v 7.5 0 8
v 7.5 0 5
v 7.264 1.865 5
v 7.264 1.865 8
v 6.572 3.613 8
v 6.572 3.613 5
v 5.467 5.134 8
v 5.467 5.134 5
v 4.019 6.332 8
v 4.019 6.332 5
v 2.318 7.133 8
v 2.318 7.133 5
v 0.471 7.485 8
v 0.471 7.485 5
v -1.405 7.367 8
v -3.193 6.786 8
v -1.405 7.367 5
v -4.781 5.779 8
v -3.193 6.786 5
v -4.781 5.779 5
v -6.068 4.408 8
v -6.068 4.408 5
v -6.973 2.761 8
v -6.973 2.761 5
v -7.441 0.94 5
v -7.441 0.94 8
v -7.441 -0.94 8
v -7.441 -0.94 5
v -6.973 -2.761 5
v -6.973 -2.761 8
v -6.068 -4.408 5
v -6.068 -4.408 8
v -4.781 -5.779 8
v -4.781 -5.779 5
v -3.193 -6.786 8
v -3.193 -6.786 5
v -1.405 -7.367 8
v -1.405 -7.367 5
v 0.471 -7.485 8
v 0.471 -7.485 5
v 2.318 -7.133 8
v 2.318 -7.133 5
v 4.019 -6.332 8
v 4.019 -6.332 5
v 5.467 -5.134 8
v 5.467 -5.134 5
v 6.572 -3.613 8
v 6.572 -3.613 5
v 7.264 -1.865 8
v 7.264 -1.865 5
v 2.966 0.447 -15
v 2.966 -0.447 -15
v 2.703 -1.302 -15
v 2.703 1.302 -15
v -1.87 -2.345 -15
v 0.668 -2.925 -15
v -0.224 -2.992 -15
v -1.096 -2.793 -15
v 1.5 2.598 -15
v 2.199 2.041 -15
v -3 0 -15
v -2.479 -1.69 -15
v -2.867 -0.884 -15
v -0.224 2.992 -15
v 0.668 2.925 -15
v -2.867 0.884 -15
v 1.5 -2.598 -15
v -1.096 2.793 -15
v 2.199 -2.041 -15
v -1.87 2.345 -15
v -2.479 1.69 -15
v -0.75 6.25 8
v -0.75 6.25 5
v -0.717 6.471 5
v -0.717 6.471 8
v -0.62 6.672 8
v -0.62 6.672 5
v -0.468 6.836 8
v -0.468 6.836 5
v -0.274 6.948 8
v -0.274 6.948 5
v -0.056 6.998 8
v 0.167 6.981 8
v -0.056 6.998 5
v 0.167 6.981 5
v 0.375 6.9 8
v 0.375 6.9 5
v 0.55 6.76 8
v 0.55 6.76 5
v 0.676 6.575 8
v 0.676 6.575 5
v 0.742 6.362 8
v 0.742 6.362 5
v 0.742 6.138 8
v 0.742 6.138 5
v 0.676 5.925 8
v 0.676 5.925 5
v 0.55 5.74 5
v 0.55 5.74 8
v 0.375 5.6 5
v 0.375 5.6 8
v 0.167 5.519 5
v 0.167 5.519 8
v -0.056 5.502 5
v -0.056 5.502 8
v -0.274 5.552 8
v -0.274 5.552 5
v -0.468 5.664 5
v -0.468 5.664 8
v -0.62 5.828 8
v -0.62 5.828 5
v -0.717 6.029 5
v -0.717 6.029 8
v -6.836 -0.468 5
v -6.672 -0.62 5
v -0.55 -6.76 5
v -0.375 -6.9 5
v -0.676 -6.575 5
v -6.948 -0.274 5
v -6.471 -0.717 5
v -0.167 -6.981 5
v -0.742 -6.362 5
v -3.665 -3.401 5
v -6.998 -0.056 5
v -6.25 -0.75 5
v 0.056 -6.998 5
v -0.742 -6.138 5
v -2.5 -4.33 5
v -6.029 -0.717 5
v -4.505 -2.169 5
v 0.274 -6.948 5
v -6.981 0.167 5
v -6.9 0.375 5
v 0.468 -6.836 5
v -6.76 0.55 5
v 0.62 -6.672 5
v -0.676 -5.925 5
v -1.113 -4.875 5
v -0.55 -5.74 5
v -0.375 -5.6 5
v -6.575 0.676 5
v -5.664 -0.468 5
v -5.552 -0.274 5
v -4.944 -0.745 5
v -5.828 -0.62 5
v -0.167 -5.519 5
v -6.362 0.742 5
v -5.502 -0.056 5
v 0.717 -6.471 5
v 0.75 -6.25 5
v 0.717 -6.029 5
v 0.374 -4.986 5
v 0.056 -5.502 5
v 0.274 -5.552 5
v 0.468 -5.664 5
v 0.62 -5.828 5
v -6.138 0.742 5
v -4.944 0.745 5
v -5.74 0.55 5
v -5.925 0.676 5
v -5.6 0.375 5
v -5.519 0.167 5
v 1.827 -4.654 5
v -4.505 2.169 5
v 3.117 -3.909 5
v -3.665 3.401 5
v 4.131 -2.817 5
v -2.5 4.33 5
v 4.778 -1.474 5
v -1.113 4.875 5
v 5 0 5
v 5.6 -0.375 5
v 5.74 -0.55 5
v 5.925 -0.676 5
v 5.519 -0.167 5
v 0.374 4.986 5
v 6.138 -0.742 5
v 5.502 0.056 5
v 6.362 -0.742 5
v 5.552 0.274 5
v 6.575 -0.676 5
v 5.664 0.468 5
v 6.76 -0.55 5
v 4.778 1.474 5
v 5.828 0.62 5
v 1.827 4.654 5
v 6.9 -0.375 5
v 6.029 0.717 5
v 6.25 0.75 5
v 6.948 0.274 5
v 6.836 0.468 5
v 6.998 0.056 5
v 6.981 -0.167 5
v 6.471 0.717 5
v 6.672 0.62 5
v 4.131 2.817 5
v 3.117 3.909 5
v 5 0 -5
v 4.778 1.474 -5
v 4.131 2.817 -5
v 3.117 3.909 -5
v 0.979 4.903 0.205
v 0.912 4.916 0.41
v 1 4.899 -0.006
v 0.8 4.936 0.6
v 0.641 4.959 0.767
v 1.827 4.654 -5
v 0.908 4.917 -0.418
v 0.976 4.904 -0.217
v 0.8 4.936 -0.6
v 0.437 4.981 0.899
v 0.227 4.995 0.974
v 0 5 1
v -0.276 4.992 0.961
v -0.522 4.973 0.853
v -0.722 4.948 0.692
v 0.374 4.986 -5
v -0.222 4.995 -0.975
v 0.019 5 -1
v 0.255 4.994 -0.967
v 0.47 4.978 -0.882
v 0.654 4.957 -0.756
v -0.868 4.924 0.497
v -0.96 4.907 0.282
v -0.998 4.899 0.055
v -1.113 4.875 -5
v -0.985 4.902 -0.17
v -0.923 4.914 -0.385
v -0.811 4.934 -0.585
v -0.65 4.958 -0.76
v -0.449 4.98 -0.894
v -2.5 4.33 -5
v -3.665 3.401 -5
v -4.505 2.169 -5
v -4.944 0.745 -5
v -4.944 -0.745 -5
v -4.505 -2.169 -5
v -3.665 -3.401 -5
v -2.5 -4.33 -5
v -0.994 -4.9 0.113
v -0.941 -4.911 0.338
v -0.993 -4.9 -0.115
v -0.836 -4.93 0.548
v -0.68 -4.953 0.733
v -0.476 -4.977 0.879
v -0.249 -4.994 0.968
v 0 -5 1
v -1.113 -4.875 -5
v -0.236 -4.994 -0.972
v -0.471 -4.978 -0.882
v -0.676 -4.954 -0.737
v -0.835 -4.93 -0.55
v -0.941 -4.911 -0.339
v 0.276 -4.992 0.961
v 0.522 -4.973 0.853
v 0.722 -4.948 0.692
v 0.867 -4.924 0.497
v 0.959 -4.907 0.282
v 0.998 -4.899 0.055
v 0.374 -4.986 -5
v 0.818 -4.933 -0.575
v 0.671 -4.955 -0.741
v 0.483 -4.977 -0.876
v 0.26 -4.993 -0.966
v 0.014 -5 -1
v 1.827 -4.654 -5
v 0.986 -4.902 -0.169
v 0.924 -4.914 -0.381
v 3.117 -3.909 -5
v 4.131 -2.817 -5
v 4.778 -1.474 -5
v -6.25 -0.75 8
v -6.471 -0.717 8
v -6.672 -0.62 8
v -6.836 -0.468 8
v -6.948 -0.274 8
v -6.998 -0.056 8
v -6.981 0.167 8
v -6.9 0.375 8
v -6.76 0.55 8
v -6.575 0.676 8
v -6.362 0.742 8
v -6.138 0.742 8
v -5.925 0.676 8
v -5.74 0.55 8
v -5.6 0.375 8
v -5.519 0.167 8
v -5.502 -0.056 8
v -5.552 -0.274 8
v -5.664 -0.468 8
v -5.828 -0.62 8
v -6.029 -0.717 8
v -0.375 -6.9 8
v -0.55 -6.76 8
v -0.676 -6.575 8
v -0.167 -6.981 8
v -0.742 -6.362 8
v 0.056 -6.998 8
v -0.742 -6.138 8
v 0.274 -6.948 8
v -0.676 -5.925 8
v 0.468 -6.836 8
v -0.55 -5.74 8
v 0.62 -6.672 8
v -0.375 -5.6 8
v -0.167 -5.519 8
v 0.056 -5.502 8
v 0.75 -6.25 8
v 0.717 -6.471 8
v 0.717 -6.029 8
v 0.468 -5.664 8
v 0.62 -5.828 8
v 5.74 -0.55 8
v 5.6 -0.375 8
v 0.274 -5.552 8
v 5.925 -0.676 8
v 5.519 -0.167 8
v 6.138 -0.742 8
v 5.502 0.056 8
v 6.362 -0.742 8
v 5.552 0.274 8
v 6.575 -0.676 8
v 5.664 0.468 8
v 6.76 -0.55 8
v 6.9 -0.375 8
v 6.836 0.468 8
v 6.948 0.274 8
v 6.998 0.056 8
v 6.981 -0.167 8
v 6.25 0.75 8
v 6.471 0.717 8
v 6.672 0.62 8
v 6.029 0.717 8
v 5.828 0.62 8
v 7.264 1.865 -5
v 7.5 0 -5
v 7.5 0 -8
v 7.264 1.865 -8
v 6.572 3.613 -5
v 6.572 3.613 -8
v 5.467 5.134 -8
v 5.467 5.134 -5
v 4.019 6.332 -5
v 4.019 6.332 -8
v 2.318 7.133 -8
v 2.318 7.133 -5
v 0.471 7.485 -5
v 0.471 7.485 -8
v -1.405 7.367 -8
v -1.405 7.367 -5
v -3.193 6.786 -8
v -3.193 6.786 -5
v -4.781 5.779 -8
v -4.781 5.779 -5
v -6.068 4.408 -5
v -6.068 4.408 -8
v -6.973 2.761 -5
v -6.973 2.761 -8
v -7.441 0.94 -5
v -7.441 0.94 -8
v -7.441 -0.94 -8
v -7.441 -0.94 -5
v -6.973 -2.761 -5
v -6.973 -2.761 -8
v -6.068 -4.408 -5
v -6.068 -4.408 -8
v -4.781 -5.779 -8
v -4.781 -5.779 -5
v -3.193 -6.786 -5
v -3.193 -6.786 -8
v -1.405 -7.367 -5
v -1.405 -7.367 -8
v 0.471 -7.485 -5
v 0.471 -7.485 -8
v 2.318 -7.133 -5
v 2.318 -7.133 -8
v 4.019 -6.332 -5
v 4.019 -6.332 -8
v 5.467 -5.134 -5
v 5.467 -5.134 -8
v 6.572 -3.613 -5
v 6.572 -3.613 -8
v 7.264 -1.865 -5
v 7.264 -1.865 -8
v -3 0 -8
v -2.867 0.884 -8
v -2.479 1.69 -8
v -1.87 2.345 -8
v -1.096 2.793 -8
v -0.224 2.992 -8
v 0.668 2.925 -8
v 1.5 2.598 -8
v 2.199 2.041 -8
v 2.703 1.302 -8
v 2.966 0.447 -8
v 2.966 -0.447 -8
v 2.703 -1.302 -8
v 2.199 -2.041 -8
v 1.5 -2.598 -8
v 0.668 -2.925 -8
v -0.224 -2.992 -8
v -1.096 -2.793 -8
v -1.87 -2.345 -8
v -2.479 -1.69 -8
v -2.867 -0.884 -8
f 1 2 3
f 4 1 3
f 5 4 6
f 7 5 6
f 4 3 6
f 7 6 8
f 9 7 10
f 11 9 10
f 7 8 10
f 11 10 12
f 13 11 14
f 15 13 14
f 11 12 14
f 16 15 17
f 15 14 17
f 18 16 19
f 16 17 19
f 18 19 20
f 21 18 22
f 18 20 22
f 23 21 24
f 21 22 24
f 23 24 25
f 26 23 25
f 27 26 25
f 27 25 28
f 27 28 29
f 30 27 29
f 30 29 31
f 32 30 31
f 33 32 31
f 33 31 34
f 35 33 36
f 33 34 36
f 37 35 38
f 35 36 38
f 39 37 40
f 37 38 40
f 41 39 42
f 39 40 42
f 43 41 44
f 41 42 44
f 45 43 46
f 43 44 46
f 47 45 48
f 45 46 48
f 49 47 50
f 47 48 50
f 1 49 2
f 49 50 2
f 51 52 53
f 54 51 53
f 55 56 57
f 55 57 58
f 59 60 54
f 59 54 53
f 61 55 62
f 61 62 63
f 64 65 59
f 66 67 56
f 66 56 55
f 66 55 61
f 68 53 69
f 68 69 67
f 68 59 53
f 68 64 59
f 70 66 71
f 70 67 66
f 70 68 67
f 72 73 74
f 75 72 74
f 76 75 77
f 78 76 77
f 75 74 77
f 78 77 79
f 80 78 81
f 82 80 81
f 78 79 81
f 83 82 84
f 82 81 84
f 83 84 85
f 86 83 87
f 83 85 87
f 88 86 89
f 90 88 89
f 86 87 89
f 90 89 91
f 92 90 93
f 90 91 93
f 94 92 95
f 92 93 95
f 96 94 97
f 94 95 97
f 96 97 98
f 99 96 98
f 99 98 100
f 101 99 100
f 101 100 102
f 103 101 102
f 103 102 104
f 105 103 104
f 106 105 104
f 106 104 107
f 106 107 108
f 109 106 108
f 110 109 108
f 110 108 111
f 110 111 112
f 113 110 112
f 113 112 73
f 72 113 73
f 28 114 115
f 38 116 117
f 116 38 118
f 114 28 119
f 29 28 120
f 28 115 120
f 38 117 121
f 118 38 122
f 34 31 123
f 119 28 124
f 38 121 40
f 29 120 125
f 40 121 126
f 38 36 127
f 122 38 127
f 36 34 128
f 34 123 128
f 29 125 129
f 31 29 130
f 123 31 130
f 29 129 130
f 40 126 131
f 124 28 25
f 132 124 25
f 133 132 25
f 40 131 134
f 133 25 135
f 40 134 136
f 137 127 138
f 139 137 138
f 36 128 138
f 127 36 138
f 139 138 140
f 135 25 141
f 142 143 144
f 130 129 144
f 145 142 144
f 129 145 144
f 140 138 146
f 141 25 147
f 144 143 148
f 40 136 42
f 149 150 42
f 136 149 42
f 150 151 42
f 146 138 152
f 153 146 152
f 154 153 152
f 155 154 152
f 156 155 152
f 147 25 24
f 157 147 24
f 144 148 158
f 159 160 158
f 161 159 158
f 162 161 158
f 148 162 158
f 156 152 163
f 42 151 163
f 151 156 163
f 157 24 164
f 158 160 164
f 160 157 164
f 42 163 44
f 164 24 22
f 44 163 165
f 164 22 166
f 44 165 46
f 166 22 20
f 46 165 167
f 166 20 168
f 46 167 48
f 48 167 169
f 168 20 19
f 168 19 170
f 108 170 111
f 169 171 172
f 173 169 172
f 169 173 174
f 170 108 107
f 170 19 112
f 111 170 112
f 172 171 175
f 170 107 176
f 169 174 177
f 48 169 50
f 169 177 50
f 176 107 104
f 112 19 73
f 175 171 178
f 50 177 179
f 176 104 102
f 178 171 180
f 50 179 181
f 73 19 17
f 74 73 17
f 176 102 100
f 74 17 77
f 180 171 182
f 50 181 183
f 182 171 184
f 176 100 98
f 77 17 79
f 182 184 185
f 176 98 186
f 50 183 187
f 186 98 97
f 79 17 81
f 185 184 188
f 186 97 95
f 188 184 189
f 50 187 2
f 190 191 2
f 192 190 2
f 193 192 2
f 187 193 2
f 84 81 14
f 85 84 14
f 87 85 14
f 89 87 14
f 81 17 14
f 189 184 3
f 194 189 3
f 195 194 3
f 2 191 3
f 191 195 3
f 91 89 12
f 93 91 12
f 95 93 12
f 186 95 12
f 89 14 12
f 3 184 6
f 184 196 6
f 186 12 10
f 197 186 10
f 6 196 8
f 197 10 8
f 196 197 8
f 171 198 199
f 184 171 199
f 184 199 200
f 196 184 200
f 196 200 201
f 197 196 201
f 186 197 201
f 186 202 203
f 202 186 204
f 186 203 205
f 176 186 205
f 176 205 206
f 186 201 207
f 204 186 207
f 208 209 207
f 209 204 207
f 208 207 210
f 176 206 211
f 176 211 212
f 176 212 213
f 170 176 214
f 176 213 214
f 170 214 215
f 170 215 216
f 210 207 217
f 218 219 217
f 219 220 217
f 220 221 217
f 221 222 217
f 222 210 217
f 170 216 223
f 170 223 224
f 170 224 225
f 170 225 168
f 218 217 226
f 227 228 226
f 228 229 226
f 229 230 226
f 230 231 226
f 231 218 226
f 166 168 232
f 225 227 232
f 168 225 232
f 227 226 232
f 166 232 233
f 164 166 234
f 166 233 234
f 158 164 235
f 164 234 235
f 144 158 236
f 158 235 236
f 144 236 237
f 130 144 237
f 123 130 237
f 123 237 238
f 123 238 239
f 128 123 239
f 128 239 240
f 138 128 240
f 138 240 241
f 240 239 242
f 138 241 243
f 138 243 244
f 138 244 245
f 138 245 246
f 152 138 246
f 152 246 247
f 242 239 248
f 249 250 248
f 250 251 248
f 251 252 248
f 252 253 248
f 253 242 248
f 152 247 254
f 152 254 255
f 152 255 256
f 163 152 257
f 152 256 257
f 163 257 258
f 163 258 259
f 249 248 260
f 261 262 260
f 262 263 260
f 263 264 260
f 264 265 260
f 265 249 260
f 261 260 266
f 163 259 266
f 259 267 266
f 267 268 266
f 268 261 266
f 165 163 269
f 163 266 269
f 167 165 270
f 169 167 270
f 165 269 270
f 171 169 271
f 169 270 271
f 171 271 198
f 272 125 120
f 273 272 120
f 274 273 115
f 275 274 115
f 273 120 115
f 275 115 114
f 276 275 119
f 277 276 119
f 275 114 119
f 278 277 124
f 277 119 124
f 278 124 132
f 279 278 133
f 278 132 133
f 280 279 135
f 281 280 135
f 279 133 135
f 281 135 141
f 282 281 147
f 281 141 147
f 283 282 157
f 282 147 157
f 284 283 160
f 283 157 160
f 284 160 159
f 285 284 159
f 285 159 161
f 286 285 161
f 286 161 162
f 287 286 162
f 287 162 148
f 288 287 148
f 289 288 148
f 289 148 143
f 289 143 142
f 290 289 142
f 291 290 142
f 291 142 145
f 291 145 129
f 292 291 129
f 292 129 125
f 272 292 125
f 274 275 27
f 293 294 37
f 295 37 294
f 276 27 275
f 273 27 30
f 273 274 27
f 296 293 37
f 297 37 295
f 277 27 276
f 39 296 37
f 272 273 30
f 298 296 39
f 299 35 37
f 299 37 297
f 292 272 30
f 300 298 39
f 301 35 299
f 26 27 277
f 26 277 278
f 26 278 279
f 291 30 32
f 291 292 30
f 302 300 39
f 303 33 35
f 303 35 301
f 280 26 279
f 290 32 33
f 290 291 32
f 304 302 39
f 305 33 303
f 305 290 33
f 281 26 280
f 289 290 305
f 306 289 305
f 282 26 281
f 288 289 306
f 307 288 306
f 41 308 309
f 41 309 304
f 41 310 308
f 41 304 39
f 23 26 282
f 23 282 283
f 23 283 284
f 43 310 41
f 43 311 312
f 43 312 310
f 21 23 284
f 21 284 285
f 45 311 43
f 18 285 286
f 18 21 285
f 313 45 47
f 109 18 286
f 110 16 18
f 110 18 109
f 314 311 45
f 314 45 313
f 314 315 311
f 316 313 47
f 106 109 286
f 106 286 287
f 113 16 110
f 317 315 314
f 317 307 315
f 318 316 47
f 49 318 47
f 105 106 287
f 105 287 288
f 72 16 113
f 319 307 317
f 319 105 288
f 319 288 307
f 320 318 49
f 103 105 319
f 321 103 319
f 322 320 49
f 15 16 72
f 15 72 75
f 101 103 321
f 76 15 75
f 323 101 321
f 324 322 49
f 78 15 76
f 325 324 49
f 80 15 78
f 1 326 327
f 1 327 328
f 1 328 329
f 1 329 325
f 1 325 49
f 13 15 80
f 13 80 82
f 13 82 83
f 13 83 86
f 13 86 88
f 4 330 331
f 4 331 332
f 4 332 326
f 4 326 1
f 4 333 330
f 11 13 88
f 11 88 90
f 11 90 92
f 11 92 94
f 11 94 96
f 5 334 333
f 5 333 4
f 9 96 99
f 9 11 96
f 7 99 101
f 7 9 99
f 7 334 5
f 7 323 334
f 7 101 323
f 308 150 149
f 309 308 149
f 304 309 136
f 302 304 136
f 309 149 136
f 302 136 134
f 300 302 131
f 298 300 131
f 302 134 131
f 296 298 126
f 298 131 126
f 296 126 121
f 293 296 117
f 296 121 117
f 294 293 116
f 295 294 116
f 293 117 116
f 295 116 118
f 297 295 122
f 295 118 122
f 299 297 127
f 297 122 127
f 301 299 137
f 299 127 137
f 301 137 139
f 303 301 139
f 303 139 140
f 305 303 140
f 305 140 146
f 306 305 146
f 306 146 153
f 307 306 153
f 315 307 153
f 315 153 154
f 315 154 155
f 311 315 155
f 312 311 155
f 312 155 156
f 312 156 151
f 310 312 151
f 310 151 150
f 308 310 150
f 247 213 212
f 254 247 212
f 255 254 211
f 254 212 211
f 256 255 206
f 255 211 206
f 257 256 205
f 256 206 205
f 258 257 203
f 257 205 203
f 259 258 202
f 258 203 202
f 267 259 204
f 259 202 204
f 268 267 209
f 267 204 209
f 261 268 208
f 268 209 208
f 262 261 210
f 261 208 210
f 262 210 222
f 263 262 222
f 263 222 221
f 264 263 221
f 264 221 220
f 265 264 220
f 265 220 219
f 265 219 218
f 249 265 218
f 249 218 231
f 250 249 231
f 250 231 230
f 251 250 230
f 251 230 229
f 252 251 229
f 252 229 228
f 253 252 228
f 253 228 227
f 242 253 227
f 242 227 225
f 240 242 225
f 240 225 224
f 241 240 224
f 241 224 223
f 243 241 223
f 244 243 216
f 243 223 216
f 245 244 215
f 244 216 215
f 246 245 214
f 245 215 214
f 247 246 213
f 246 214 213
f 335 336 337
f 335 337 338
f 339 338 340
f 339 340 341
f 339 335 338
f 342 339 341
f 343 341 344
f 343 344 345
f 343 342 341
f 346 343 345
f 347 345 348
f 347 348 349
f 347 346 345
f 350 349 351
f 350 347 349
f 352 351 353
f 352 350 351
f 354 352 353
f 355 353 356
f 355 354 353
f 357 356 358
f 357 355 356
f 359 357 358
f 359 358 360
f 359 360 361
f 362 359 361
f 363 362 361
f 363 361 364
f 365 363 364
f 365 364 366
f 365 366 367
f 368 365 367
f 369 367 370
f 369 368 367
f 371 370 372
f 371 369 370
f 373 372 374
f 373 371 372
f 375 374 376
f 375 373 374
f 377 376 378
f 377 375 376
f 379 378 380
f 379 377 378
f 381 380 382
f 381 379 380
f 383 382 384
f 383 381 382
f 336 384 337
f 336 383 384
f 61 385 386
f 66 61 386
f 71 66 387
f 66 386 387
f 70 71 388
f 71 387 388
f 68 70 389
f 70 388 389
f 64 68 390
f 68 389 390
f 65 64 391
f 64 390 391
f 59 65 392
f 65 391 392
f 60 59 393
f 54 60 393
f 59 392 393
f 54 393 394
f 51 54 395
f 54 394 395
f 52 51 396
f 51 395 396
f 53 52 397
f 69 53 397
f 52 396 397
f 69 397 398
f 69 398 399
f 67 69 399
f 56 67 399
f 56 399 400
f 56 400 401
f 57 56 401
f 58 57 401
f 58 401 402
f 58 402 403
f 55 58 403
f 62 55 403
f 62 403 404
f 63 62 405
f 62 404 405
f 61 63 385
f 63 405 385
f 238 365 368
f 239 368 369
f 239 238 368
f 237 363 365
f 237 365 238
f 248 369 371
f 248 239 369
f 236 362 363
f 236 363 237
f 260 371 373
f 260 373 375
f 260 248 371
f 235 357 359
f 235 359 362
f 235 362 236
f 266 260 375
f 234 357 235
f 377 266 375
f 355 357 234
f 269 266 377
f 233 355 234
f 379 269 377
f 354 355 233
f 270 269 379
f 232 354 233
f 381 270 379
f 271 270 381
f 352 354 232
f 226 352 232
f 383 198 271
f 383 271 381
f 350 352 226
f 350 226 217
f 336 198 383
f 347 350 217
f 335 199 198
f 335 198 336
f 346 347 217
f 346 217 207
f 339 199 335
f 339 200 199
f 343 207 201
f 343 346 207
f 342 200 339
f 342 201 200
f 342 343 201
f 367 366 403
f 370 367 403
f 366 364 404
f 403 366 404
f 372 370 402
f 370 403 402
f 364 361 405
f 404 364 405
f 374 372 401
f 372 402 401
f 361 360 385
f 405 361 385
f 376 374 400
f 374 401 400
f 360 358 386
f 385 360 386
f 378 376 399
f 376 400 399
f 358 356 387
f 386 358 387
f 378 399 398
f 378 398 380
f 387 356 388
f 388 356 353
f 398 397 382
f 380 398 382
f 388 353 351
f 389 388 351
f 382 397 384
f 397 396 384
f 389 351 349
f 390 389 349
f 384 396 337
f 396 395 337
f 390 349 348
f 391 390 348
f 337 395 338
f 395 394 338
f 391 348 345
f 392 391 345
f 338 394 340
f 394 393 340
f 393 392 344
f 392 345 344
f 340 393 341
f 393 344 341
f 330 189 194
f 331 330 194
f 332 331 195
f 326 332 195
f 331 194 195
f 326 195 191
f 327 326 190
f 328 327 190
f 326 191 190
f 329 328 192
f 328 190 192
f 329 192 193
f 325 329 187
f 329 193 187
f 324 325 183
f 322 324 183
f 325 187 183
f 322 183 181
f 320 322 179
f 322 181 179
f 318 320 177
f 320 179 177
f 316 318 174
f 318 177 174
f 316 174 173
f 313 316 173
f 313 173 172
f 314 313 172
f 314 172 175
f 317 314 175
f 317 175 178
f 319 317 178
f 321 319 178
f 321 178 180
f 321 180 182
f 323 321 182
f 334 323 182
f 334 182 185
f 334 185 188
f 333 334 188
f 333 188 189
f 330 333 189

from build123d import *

# Parameters (mm, degrees)
BOSS_EXTRUDE1_DEPTH      = 5
BOSS_EXTRUDE1_DEPTH_BACK = 5
SKETCH1_R                = 5
SKETCH3_R                = 7.5
BOSS_EXTRUDE2_DEPTH      = 3
SKETCH4_R                = 1
CUT_EXTRUDE1_DEPTH       = 17.628289148
SKETCH5_R                = 0.75
CUT_EXTRUDE2_DEPTH       = 17.777961736
CIRPATTERN1_COUNT        = 4
SKETCH6_R                = 3
BOSS_EXTRUDE3_DEPTH      = 7


with BuildPart() as part:
    # Sketch1 → Boss-Extrude1 (new, two sides: drawn at the far end of the back side and taken through both)
    with BuildSketch(Plane.XY.offset(-BOSS_EXTRUDE1_DEPTH_BACK)):
        Circle(SKETCH1_R)
    extrude(amount=BOSS_EXTRUDE1_DEPTH + BOSS_EXTRUDE1_DEPTH_BACK)

    # Sketch3 → Boss-Extrude2 (add)
    with BuildSketch(Plane.XY.offset(5)):
        Circle(SKETCH3_R)
    boss_extrude2 = extrude(amount=BOSS_EXTRUDE2_DEPTH)

    # Mirror1: Boss-Extrude2 across plane
    add(boss_extrude2.mirror(Plane.XY))

    # Sketch4 → Cut-Extrude1 (cut, through all)
    with BuildSketch(Plane(origin=(0, 5, 0), x_dir=(1, 0, 0), z_dir=(0, 1, 0))):
        Circle(SKETCH4_R)
    extrude(amount=-CUT_EXTRUDE1_DEPTH, mode=Mode.SUBTRACT)

    # Sketch5 → Cut-Extrude2 (cut, through all)
    with BuildSketch(Plane(origin=(0, 0, 5), x_dir=(-1, 0, 0), z_dir=(0, 0, -1))):
        with Locations((0, 6.25)):
            Circle(SKETCH5_R)
    cut_extrude2 = extrude(amount=-CUT_EXTRUDE2_DEPTH, mode=Mode.SUBTRACT)

    # CirPattern1: Cut-Extrude2 ×4 about axis
    cirpattern1_axis = Axis((0, 0, -5), (0, 0, 1))
    for i in range(1, CIRPATTERN1_COUNT):
        add(cut_extrude2.rotate(cirpattern1_axis, i * 360 / CIRPATTERN1_COUNT), mode=Mode.SUBTRACT)

    # Sketch6 → Boss-Extrude3 (add)
    with BuildSketch(Plane(origin=(0, 0, -8), x_dir=(-1, 0, 0), z_dir=(0, 0, -1))):
        Circle(SKETCH6_R)
    extrude(amount=BOSS_EXTRUDE3_DEPTH)


solid = part.part
